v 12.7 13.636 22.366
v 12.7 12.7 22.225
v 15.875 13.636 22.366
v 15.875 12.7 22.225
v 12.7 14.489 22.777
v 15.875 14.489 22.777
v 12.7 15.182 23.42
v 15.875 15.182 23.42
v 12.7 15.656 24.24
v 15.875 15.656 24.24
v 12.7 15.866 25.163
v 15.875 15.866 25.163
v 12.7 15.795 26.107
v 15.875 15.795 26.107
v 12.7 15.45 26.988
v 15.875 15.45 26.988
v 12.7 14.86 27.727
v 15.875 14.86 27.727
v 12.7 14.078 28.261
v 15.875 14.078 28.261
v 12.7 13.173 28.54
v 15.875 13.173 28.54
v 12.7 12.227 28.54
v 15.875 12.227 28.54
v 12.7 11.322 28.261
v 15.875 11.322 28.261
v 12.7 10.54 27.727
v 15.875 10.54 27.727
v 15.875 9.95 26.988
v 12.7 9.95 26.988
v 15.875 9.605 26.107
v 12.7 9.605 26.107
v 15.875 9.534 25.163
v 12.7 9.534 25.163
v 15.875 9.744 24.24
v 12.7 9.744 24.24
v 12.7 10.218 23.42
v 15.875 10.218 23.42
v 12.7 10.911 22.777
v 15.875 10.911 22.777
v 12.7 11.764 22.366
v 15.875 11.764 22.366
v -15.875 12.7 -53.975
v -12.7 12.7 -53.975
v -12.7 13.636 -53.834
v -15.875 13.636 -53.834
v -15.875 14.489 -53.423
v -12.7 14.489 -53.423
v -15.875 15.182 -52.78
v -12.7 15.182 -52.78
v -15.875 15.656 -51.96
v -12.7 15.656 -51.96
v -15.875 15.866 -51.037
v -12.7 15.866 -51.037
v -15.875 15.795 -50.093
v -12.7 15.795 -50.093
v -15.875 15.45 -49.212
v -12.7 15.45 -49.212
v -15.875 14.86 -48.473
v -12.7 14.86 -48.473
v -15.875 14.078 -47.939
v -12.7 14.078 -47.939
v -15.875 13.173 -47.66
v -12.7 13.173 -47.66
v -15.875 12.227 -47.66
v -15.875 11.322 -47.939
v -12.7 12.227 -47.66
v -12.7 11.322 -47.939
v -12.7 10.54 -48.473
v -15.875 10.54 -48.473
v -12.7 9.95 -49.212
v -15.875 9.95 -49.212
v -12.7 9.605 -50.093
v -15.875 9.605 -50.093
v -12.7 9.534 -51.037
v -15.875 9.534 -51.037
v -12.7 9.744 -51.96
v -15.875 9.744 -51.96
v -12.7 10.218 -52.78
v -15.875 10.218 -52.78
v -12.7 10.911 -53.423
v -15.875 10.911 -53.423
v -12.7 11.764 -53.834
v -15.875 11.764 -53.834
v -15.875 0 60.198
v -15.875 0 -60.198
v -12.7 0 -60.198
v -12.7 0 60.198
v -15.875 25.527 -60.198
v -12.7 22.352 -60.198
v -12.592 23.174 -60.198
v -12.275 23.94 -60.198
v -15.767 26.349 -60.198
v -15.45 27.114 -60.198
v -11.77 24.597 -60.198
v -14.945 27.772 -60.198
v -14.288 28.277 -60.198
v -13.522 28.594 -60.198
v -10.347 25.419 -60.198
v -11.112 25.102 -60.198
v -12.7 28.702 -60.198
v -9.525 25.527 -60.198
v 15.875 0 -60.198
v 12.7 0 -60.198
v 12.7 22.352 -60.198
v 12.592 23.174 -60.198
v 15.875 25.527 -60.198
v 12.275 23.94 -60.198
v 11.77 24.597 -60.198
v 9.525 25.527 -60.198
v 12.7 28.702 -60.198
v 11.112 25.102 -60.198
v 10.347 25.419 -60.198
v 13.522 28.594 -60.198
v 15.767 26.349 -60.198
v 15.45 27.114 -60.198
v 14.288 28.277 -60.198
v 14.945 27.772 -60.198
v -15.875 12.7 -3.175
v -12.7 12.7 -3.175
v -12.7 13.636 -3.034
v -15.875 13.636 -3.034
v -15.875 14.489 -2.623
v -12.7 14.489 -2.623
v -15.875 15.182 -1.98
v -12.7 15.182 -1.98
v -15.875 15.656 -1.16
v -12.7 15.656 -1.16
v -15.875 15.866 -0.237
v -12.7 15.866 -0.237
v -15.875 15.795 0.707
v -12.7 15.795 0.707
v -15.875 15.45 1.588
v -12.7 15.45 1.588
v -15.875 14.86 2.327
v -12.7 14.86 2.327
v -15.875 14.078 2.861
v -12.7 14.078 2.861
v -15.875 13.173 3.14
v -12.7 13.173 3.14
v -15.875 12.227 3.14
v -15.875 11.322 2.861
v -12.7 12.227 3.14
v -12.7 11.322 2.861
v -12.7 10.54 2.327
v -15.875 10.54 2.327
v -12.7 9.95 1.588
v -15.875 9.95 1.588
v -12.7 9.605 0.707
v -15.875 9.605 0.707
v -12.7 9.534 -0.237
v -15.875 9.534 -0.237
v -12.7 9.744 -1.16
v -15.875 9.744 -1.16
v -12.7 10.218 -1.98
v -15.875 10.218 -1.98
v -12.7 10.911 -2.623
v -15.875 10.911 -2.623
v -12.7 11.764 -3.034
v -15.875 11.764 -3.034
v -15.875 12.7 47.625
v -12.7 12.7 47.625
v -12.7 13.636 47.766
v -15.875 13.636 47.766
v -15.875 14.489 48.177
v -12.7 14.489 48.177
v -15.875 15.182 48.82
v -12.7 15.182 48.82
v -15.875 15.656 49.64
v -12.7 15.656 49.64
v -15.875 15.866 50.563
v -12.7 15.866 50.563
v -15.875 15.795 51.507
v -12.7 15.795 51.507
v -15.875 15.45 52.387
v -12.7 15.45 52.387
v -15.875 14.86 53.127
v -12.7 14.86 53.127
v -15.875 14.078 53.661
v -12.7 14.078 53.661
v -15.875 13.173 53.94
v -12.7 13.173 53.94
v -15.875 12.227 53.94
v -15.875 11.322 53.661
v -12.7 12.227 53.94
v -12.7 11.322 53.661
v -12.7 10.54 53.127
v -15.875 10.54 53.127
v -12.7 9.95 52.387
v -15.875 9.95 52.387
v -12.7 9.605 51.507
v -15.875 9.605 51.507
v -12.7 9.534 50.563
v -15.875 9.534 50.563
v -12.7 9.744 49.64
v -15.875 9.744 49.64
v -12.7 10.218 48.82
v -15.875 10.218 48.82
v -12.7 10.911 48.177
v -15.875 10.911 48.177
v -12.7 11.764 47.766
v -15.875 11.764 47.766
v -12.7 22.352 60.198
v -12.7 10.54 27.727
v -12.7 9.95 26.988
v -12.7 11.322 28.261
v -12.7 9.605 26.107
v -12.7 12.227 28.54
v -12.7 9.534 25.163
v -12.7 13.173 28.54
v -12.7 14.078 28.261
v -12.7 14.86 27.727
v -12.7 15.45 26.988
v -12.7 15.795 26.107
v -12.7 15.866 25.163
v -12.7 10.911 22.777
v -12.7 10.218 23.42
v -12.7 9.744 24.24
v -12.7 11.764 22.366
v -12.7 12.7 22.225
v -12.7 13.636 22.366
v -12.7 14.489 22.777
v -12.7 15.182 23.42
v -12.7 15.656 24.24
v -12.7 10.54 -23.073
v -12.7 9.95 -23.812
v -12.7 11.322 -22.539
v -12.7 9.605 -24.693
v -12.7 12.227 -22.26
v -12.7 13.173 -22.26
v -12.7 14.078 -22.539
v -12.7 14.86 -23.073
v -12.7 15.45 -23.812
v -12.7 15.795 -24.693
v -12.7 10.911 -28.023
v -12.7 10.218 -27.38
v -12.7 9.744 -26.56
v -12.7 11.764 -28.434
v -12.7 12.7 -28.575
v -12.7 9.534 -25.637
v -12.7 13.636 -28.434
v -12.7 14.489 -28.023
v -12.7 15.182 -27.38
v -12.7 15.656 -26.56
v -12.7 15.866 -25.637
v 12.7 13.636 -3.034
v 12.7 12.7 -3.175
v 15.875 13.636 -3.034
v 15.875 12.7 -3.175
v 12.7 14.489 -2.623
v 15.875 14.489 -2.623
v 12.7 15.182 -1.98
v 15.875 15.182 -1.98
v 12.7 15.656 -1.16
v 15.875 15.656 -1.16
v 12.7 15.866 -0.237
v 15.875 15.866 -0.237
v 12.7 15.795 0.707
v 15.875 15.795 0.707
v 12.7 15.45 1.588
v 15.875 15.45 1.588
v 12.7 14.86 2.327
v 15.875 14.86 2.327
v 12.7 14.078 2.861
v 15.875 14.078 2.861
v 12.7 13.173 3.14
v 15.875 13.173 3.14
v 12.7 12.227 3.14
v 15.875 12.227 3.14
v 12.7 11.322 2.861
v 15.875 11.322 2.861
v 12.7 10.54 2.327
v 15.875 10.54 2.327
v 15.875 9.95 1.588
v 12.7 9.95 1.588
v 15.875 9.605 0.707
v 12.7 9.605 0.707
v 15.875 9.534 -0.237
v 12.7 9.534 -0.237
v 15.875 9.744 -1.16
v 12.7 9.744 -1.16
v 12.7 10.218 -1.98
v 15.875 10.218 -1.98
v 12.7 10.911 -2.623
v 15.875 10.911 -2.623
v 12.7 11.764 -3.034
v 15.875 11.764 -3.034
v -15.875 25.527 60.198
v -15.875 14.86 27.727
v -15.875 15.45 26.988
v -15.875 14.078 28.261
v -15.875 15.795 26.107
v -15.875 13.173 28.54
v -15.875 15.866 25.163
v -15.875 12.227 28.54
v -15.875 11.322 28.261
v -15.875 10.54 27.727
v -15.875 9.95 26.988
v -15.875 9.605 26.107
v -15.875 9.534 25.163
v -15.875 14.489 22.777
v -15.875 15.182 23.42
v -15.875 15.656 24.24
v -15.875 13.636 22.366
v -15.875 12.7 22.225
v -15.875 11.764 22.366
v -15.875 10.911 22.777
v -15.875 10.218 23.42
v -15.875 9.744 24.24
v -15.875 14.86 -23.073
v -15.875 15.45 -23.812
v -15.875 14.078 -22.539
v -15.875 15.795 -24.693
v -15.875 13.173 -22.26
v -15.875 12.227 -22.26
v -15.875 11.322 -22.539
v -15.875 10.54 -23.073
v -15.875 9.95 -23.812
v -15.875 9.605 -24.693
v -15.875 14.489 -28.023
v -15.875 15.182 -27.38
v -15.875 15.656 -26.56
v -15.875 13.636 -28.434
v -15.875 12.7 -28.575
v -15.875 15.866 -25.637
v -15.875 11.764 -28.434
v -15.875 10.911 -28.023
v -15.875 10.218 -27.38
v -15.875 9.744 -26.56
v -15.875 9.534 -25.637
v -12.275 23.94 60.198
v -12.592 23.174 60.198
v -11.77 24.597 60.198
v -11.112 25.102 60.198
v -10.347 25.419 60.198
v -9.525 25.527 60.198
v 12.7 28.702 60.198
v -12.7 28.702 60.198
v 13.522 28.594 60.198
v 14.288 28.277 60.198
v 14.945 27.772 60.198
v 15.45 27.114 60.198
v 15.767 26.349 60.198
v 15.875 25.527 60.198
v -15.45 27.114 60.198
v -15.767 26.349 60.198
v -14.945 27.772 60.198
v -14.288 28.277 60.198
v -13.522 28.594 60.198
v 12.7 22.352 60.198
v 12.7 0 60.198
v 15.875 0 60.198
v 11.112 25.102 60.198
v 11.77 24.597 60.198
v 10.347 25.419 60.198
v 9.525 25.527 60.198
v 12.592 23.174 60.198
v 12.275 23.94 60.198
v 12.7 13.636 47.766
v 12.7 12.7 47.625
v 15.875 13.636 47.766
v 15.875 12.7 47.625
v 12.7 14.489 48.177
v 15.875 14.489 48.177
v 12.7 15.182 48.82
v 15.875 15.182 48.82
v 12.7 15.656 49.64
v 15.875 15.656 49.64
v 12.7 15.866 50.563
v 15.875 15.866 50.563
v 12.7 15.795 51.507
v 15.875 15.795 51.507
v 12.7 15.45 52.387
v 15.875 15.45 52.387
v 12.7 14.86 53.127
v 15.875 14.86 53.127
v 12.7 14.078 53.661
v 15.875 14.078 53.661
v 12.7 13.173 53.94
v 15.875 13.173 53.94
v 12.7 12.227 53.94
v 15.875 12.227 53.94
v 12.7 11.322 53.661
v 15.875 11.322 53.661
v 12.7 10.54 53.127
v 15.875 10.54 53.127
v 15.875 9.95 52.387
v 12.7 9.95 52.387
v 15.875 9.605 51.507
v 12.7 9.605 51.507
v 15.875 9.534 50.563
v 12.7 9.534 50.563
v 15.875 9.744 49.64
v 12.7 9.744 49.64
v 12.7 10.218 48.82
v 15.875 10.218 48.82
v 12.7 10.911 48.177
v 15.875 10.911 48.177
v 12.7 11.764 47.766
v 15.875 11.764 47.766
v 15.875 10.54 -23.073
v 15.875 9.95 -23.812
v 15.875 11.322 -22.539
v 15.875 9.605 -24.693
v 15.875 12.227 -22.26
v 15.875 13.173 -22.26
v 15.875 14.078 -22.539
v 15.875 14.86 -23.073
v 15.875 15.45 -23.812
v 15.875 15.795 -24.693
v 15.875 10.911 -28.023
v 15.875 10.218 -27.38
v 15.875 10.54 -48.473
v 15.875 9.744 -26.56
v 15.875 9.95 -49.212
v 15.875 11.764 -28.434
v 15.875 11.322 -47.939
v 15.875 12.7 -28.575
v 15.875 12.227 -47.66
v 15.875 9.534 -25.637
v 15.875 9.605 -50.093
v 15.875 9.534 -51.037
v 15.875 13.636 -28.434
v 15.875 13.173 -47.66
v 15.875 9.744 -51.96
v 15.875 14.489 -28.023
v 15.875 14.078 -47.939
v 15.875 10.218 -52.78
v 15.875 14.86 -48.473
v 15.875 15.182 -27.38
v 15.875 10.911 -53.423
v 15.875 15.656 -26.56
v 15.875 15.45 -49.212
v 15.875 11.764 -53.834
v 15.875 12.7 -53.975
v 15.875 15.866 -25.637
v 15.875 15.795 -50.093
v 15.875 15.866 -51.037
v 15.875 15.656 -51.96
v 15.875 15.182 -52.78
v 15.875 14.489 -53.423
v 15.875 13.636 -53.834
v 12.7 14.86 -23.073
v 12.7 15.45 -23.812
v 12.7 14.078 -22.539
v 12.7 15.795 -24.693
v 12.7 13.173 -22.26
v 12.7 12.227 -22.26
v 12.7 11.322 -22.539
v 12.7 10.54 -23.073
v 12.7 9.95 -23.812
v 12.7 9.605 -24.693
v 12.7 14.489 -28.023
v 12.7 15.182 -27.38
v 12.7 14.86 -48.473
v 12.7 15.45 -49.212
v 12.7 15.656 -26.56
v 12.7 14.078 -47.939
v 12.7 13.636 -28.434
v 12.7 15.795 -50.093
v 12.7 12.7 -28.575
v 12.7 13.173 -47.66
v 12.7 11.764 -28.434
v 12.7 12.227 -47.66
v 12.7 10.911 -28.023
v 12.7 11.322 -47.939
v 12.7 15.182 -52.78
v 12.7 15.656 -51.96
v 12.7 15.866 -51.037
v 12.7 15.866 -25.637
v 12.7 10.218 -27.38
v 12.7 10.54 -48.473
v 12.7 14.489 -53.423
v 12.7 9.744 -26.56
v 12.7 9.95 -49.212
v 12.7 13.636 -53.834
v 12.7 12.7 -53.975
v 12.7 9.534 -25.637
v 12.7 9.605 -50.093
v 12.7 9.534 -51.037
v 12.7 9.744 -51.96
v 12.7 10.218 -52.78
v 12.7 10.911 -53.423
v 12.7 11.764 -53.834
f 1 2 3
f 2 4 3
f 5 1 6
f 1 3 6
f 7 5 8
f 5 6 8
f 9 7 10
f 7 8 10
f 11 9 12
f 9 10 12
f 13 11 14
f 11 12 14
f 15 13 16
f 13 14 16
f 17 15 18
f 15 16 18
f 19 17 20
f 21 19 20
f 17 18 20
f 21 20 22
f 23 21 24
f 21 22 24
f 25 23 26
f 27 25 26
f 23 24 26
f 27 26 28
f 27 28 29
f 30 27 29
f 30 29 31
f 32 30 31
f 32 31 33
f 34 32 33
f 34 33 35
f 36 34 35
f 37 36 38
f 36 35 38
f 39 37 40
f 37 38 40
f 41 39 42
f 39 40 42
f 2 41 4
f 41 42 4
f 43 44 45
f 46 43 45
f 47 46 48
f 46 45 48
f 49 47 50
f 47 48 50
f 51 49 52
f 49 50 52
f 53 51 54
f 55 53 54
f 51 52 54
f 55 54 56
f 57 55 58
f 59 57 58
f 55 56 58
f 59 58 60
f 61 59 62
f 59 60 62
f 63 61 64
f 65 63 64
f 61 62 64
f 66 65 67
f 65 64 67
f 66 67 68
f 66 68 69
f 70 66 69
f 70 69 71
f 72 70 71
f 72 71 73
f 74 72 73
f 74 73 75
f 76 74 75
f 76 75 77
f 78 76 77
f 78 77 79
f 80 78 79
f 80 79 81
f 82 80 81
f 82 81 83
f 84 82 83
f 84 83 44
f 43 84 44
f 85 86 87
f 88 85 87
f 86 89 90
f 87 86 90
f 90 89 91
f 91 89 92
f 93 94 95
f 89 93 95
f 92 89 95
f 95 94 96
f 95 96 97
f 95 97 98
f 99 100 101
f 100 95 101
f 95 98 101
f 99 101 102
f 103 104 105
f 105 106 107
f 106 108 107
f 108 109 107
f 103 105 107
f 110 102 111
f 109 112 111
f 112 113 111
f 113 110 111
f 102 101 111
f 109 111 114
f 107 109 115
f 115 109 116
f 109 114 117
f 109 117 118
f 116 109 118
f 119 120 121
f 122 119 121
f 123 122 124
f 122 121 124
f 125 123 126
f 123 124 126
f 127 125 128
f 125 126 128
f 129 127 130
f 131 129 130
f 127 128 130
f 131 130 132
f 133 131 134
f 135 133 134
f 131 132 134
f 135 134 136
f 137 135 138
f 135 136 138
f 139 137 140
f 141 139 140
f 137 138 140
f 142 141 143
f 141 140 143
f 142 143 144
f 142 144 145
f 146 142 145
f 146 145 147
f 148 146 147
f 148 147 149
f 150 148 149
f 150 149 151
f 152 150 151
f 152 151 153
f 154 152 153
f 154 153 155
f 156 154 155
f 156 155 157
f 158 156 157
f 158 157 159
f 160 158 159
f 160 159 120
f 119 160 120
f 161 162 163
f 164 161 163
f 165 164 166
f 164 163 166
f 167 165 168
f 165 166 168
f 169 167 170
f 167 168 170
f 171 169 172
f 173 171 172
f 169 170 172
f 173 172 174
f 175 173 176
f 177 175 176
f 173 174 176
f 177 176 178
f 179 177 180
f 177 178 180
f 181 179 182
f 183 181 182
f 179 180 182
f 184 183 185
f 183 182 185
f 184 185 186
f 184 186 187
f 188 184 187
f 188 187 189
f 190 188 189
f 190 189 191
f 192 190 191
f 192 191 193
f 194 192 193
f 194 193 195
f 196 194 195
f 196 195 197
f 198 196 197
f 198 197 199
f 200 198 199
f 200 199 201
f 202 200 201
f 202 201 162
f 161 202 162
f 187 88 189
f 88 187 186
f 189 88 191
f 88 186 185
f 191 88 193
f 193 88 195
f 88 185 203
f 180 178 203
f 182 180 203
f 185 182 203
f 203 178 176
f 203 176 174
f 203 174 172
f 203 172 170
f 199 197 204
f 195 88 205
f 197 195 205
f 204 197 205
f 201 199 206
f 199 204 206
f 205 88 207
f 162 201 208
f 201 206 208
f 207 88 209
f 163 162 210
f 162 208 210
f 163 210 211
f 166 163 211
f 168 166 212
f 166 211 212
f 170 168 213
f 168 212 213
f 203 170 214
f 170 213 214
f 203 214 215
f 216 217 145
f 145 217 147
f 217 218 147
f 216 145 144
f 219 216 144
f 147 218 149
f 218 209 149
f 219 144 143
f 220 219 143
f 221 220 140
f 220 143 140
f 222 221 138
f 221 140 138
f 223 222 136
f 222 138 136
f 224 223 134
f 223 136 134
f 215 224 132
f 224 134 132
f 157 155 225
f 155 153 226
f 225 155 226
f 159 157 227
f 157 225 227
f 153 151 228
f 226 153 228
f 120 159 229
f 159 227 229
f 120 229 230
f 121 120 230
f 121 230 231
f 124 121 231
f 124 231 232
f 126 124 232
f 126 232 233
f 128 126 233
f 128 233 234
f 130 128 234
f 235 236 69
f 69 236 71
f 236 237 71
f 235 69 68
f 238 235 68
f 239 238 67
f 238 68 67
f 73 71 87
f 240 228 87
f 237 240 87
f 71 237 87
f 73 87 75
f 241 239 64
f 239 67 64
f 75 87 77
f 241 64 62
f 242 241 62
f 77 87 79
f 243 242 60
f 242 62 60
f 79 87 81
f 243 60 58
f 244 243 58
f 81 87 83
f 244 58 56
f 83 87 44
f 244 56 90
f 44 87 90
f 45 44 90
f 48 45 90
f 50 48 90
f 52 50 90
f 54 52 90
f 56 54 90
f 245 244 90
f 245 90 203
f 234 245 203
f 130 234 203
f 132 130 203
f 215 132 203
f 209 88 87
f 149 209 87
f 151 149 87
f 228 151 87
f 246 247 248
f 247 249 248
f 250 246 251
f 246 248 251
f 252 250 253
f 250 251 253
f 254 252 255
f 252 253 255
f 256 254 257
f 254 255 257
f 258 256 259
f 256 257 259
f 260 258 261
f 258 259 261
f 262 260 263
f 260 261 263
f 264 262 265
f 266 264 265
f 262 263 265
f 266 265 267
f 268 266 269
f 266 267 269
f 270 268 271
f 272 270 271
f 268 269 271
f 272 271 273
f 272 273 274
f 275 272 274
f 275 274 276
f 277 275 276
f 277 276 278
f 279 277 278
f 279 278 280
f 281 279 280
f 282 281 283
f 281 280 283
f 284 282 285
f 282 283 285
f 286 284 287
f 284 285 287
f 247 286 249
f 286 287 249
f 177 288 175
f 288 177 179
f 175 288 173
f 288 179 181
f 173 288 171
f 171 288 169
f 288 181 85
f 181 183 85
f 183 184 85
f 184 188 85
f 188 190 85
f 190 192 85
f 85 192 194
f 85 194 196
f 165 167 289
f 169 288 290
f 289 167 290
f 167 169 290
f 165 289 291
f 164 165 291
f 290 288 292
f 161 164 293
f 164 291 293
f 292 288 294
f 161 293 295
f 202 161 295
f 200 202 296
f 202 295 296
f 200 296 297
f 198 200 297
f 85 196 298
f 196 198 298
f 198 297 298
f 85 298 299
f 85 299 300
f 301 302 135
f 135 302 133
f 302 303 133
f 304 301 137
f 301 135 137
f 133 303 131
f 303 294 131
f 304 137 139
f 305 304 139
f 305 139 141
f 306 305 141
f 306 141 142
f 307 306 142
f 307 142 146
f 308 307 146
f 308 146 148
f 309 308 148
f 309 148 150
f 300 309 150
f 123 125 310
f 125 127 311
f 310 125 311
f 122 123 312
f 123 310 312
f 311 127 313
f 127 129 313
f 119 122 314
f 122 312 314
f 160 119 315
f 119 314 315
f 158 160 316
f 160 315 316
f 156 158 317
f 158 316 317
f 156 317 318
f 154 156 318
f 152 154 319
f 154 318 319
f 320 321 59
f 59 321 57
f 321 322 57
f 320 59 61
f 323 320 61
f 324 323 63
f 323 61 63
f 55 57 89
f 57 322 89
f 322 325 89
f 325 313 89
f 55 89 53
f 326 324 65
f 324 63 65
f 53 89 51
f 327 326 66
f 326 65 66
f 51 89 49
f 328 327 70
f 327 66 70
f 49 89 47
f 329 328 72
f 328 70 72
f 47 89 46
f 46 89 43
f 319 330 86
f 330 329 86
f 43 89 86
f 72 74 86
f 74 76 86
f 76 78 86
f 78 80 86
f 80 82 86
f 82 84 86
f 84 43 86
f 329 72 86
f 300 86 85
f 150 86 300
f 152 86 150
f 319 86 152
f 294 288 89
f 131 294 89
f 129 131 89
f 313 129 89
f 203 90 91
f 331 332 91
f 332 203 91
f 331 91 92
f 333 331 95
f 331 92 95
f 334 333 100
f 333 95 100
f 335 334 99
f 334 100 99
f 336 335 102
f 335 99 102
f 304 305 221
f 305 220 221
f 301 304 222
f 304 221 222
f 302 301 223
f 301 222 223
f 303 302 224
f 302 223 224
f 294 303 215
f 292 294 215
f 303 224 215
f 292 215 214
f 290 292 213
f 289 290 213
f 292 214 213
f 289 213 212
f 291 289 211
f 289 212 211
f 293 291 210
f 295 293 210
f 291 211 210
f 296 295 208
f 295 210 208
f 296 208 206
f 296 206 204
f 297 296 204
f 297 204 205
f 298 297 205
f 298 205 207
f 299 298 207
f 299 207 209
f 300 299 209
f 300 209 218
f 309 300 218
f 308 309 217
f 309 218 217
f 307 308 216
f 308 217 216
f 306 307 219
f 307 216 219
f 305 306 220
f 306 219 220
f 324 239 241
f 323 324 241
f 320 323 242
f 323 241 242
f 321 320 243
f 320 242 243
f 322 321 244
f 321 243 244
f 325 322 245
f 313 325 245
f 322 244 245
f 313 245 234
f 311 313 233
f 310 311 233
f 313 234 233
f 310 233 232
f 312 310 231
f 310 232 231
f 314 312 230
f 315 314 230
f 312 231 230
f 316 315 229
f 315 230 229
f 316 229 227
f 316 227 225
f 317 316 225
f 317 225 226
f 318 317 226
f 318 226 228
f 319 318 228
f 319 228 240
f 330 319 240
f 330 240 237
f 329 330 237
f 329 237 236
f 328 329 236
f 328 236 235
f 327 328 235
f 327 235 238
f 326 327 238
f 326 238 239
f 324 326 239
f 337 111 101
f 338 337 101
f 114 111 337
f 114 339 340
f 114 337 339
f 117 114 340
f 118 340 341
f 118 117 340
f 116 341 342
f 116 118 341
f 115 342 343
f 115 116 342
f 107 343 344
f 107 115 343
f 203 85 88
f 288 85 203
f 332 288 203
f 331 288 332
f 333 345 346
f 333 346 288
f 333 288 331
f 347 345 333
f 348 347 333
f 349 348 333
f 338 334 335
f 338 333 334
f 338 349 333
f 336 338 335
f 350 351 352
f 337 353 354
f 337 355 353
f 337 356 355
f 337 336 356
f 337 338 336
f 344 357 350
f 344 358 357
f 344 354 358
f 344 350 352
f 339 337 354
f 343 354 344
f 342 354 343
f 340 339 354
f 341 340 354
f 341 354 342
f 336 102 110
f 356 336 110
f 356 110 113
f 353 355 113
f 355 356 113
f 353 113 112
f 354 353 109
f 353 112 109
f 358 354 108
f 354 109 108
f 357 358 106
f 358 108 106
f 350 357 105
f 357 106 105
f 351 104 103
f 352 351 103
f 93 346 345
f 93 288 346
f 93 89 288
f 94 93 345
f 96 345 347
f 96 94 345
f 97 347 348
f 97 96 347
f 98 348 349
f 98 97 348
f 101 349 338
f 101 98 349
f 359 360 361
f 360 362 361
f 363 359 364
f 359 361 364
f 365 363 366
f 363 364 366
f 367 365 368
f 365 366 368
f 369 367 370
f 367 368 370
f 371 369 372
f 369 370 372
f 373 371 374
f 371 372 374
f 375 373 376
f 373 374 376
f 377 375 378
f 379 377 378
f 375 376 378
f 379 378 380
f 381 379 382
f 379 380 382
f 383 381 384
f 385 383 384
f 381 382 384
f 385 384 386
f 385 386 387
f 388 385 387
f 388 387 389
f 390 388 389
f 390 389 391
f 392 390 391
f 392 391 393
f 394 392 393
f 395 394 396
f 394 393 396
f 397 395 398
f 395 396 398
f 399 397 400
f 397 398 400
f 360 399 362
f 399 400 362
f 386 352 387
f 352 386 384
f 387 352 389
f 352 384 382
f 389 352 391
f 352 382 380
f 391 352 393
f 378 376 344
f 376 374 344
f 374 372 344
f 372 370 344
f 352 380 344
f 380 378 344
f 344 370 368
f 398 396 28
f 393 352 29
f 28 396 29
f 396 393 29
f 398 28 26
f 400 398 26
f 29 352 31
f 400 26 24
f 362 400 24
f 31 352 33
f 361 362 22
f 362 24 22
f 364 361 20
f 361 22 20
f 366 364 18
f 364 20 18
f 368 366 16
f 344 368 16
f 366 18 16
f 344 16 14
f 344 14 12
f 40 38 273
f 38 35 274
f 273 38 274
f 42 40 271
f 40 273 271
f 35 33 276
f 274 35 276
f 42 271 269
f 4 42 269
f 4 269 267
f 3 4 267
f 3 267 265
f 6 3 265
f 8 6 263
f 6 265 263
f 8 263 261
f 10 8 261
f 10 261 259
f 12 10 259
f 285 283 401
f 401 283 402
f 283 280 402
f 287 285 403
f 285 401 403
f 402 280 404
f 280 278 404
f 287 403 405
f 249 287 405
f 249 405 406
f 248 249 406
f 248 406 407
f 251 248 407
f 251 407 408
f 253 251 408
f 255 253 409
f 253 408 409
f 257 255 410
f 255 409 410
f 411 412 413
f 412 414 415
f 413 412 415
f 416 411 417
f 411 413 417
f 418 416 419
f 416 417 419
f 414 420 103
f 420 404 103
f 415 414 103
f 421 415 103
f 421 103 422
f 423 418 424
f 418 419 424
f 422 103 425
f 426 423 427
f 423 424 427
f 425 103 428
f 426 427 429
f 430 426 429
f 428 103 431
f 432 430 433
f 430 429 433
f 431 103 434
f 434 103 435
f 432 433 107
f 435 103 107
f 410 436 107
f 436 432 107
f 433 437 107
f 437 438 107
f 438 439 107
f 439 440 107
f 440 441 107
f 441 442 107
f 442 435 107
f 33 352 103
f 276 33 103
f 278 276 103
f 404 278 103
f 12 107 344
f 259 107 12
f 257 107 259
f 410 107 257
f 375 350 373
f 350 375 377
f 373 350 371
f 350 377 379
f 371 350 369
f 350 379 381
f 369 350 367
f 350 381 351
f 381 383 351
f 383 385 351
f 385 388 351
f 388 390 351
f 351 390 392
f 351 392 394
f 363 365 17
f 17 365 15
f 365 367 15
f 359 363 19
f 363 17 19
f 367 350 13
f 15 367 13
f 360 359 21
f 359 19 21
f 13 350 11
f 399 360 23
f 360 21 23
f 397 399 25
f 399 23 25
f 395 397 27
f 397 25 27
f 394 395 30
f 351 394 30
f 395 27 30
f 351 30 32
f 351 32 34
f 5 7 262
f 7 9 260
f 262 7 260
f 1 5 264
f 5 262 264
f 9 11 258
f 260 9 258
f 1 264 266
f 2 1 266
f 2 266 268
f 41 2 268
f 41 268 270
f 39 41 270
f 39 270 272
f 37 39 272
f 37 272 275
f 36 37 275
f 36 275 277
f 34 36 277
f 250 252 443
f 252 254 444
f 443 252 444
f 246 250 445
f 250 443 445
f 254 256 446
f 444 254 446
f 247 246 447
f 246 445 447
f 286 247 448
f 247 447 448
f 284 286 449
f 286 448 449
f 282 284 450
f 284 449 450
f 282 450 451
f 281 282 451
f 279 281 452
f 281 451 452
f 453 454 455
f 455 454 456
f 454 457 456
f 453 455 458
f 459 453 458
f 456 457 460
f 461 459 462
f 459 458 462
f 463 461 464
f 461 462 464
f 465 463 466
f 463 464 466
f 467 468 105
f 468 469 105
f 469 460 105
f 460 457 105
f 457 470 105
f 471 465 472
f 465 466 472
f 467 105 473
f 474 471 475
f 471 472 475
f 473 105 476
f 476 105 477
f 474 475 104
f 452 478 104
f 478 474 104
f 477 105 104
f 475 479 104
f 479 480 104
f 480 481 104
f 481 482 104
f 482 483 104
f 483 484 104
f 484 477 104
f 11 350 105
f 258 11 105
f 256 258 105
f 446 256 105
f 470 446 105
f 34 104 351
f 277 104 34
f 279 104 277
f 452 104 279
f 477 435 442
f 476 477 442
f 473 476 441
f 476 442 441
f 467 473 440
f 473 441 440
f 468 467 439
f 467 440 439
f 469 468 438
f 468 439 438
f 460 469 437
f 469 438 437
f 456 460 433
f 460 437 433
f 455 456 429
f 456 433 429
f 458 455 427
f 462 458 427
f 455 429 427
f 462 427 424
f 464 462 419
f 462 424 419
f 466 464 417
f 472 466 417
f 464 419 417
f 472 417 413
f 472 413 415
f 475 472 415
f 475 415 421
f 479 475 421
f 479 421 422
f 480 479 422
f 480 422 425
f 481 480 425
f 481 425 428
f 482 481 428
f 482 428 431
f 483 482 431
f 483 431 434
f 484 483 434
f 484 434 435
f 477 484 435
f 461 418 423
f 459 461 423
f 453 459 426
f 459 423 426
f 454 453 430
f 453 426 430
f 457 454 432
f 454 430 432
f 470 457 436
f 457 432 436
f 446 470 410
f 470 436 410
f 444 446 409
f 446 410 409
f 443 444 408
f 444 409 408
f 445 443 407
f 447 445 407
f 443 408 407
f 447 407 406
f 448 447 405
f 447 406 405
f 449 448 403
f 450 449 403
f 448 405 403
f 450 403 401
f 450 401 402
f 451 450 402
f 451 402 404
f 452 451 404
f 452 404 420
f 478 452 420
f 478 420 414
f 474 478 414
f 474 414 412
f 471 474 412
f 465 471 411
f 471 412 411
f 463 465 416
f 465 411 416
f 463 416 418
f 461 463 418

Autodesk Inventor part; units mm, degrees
ref_plane "YZ Plane" through (0, 0, 0) normal (1, 0, 0) x (0, 1, 0)
ref_plane "XZ Plane" through (0, 0, 0) normal (0, 1, 0) x (-1, 0, 0)
ref_plane "XY Plane" through (0, 0, 0) normal (0, 0, 1) x (1, 0, 0)
sketch "Sketch1" plane through (0, 0, 0) normal (0, 0, 1) x (1, 0, 0)
  line L0 (-15.875, 0) -> (-12.7, 0)
  line L1 (-12.7, 0) -> (-12.7, 22.352)
  line L2 (-9.525, 25.527) -> (9.525, 25.527)
  line L3 (12.7, 22.352) -> (12.7, 0)
  line L4 (12.7, 0) -> (15.875, 0)
  line L5 (15.875, 0) -> (15.875, 25.527)
  line L6 (12.7, 28.702) -> (-12.7, 28.702)
  line L7 (-15.875, 25.527) -> (-15.875, 0)
  arc A0 (-9.525, 25.527) -> (-12.7, 22.352) centre (-9.525, 22.352) ccw
  arc A1 (12.7, 22.352) -> (9.525, 25.527) centre (9.525, 22.352) ccw
  arc A2 (-12.7, 28.702) -> (-15.875, 25.527) centre (-12.7, 25.527) ccw
  arc A3 (15.875, 25.527) -> (12.7, 28.702) centre (12.7, 25.527) ccw
  line L8 (0, 35.2315) -> (0, -5.8719) projected
  point P0 (0, 0)
  dimension "d0" = 28.702
  dimension "d1" = 31.75
  dimension "d2" = 3.175
  dimension "d3" = 3.175
  dimension "d4" = 3.175
extrude "Extrusion1" add sketch "Sketch1" along normal mid plane 120.396
sketch "Sketch4" plane through (15.875, 0, 60.198) normal (1, 0, 0) x (0, 0, -1)
  line L0 (-79.375, 0) -> (476.25, 0) projected
  line L1 (60.198, -5.7404) -> (60.198, 34.4424) projected
  circle A0 centre (60.198, 12.7) radius 3.175
  point P0 (60.198, 0)
  dimension "d35" = 12.7
  dimension "d36" = 0
  dimension "d37" = 6.35
extrude "Extrusion4" cut sketch "Sketch4" against normal up to surface (31.75 mm away)
pattern_linear "Rectangular Pattern3" count 20 spacing 25.4 along (0, 0, 1) count 20 spacing 25.4 along (0, 0, -1) of "Extrusion4"
equation "\"d5\" = Support3Length"
equation "\"Support3Length\" = 120.396"
properties part number "NSupportChannel3" material "Aluminum 6061"
